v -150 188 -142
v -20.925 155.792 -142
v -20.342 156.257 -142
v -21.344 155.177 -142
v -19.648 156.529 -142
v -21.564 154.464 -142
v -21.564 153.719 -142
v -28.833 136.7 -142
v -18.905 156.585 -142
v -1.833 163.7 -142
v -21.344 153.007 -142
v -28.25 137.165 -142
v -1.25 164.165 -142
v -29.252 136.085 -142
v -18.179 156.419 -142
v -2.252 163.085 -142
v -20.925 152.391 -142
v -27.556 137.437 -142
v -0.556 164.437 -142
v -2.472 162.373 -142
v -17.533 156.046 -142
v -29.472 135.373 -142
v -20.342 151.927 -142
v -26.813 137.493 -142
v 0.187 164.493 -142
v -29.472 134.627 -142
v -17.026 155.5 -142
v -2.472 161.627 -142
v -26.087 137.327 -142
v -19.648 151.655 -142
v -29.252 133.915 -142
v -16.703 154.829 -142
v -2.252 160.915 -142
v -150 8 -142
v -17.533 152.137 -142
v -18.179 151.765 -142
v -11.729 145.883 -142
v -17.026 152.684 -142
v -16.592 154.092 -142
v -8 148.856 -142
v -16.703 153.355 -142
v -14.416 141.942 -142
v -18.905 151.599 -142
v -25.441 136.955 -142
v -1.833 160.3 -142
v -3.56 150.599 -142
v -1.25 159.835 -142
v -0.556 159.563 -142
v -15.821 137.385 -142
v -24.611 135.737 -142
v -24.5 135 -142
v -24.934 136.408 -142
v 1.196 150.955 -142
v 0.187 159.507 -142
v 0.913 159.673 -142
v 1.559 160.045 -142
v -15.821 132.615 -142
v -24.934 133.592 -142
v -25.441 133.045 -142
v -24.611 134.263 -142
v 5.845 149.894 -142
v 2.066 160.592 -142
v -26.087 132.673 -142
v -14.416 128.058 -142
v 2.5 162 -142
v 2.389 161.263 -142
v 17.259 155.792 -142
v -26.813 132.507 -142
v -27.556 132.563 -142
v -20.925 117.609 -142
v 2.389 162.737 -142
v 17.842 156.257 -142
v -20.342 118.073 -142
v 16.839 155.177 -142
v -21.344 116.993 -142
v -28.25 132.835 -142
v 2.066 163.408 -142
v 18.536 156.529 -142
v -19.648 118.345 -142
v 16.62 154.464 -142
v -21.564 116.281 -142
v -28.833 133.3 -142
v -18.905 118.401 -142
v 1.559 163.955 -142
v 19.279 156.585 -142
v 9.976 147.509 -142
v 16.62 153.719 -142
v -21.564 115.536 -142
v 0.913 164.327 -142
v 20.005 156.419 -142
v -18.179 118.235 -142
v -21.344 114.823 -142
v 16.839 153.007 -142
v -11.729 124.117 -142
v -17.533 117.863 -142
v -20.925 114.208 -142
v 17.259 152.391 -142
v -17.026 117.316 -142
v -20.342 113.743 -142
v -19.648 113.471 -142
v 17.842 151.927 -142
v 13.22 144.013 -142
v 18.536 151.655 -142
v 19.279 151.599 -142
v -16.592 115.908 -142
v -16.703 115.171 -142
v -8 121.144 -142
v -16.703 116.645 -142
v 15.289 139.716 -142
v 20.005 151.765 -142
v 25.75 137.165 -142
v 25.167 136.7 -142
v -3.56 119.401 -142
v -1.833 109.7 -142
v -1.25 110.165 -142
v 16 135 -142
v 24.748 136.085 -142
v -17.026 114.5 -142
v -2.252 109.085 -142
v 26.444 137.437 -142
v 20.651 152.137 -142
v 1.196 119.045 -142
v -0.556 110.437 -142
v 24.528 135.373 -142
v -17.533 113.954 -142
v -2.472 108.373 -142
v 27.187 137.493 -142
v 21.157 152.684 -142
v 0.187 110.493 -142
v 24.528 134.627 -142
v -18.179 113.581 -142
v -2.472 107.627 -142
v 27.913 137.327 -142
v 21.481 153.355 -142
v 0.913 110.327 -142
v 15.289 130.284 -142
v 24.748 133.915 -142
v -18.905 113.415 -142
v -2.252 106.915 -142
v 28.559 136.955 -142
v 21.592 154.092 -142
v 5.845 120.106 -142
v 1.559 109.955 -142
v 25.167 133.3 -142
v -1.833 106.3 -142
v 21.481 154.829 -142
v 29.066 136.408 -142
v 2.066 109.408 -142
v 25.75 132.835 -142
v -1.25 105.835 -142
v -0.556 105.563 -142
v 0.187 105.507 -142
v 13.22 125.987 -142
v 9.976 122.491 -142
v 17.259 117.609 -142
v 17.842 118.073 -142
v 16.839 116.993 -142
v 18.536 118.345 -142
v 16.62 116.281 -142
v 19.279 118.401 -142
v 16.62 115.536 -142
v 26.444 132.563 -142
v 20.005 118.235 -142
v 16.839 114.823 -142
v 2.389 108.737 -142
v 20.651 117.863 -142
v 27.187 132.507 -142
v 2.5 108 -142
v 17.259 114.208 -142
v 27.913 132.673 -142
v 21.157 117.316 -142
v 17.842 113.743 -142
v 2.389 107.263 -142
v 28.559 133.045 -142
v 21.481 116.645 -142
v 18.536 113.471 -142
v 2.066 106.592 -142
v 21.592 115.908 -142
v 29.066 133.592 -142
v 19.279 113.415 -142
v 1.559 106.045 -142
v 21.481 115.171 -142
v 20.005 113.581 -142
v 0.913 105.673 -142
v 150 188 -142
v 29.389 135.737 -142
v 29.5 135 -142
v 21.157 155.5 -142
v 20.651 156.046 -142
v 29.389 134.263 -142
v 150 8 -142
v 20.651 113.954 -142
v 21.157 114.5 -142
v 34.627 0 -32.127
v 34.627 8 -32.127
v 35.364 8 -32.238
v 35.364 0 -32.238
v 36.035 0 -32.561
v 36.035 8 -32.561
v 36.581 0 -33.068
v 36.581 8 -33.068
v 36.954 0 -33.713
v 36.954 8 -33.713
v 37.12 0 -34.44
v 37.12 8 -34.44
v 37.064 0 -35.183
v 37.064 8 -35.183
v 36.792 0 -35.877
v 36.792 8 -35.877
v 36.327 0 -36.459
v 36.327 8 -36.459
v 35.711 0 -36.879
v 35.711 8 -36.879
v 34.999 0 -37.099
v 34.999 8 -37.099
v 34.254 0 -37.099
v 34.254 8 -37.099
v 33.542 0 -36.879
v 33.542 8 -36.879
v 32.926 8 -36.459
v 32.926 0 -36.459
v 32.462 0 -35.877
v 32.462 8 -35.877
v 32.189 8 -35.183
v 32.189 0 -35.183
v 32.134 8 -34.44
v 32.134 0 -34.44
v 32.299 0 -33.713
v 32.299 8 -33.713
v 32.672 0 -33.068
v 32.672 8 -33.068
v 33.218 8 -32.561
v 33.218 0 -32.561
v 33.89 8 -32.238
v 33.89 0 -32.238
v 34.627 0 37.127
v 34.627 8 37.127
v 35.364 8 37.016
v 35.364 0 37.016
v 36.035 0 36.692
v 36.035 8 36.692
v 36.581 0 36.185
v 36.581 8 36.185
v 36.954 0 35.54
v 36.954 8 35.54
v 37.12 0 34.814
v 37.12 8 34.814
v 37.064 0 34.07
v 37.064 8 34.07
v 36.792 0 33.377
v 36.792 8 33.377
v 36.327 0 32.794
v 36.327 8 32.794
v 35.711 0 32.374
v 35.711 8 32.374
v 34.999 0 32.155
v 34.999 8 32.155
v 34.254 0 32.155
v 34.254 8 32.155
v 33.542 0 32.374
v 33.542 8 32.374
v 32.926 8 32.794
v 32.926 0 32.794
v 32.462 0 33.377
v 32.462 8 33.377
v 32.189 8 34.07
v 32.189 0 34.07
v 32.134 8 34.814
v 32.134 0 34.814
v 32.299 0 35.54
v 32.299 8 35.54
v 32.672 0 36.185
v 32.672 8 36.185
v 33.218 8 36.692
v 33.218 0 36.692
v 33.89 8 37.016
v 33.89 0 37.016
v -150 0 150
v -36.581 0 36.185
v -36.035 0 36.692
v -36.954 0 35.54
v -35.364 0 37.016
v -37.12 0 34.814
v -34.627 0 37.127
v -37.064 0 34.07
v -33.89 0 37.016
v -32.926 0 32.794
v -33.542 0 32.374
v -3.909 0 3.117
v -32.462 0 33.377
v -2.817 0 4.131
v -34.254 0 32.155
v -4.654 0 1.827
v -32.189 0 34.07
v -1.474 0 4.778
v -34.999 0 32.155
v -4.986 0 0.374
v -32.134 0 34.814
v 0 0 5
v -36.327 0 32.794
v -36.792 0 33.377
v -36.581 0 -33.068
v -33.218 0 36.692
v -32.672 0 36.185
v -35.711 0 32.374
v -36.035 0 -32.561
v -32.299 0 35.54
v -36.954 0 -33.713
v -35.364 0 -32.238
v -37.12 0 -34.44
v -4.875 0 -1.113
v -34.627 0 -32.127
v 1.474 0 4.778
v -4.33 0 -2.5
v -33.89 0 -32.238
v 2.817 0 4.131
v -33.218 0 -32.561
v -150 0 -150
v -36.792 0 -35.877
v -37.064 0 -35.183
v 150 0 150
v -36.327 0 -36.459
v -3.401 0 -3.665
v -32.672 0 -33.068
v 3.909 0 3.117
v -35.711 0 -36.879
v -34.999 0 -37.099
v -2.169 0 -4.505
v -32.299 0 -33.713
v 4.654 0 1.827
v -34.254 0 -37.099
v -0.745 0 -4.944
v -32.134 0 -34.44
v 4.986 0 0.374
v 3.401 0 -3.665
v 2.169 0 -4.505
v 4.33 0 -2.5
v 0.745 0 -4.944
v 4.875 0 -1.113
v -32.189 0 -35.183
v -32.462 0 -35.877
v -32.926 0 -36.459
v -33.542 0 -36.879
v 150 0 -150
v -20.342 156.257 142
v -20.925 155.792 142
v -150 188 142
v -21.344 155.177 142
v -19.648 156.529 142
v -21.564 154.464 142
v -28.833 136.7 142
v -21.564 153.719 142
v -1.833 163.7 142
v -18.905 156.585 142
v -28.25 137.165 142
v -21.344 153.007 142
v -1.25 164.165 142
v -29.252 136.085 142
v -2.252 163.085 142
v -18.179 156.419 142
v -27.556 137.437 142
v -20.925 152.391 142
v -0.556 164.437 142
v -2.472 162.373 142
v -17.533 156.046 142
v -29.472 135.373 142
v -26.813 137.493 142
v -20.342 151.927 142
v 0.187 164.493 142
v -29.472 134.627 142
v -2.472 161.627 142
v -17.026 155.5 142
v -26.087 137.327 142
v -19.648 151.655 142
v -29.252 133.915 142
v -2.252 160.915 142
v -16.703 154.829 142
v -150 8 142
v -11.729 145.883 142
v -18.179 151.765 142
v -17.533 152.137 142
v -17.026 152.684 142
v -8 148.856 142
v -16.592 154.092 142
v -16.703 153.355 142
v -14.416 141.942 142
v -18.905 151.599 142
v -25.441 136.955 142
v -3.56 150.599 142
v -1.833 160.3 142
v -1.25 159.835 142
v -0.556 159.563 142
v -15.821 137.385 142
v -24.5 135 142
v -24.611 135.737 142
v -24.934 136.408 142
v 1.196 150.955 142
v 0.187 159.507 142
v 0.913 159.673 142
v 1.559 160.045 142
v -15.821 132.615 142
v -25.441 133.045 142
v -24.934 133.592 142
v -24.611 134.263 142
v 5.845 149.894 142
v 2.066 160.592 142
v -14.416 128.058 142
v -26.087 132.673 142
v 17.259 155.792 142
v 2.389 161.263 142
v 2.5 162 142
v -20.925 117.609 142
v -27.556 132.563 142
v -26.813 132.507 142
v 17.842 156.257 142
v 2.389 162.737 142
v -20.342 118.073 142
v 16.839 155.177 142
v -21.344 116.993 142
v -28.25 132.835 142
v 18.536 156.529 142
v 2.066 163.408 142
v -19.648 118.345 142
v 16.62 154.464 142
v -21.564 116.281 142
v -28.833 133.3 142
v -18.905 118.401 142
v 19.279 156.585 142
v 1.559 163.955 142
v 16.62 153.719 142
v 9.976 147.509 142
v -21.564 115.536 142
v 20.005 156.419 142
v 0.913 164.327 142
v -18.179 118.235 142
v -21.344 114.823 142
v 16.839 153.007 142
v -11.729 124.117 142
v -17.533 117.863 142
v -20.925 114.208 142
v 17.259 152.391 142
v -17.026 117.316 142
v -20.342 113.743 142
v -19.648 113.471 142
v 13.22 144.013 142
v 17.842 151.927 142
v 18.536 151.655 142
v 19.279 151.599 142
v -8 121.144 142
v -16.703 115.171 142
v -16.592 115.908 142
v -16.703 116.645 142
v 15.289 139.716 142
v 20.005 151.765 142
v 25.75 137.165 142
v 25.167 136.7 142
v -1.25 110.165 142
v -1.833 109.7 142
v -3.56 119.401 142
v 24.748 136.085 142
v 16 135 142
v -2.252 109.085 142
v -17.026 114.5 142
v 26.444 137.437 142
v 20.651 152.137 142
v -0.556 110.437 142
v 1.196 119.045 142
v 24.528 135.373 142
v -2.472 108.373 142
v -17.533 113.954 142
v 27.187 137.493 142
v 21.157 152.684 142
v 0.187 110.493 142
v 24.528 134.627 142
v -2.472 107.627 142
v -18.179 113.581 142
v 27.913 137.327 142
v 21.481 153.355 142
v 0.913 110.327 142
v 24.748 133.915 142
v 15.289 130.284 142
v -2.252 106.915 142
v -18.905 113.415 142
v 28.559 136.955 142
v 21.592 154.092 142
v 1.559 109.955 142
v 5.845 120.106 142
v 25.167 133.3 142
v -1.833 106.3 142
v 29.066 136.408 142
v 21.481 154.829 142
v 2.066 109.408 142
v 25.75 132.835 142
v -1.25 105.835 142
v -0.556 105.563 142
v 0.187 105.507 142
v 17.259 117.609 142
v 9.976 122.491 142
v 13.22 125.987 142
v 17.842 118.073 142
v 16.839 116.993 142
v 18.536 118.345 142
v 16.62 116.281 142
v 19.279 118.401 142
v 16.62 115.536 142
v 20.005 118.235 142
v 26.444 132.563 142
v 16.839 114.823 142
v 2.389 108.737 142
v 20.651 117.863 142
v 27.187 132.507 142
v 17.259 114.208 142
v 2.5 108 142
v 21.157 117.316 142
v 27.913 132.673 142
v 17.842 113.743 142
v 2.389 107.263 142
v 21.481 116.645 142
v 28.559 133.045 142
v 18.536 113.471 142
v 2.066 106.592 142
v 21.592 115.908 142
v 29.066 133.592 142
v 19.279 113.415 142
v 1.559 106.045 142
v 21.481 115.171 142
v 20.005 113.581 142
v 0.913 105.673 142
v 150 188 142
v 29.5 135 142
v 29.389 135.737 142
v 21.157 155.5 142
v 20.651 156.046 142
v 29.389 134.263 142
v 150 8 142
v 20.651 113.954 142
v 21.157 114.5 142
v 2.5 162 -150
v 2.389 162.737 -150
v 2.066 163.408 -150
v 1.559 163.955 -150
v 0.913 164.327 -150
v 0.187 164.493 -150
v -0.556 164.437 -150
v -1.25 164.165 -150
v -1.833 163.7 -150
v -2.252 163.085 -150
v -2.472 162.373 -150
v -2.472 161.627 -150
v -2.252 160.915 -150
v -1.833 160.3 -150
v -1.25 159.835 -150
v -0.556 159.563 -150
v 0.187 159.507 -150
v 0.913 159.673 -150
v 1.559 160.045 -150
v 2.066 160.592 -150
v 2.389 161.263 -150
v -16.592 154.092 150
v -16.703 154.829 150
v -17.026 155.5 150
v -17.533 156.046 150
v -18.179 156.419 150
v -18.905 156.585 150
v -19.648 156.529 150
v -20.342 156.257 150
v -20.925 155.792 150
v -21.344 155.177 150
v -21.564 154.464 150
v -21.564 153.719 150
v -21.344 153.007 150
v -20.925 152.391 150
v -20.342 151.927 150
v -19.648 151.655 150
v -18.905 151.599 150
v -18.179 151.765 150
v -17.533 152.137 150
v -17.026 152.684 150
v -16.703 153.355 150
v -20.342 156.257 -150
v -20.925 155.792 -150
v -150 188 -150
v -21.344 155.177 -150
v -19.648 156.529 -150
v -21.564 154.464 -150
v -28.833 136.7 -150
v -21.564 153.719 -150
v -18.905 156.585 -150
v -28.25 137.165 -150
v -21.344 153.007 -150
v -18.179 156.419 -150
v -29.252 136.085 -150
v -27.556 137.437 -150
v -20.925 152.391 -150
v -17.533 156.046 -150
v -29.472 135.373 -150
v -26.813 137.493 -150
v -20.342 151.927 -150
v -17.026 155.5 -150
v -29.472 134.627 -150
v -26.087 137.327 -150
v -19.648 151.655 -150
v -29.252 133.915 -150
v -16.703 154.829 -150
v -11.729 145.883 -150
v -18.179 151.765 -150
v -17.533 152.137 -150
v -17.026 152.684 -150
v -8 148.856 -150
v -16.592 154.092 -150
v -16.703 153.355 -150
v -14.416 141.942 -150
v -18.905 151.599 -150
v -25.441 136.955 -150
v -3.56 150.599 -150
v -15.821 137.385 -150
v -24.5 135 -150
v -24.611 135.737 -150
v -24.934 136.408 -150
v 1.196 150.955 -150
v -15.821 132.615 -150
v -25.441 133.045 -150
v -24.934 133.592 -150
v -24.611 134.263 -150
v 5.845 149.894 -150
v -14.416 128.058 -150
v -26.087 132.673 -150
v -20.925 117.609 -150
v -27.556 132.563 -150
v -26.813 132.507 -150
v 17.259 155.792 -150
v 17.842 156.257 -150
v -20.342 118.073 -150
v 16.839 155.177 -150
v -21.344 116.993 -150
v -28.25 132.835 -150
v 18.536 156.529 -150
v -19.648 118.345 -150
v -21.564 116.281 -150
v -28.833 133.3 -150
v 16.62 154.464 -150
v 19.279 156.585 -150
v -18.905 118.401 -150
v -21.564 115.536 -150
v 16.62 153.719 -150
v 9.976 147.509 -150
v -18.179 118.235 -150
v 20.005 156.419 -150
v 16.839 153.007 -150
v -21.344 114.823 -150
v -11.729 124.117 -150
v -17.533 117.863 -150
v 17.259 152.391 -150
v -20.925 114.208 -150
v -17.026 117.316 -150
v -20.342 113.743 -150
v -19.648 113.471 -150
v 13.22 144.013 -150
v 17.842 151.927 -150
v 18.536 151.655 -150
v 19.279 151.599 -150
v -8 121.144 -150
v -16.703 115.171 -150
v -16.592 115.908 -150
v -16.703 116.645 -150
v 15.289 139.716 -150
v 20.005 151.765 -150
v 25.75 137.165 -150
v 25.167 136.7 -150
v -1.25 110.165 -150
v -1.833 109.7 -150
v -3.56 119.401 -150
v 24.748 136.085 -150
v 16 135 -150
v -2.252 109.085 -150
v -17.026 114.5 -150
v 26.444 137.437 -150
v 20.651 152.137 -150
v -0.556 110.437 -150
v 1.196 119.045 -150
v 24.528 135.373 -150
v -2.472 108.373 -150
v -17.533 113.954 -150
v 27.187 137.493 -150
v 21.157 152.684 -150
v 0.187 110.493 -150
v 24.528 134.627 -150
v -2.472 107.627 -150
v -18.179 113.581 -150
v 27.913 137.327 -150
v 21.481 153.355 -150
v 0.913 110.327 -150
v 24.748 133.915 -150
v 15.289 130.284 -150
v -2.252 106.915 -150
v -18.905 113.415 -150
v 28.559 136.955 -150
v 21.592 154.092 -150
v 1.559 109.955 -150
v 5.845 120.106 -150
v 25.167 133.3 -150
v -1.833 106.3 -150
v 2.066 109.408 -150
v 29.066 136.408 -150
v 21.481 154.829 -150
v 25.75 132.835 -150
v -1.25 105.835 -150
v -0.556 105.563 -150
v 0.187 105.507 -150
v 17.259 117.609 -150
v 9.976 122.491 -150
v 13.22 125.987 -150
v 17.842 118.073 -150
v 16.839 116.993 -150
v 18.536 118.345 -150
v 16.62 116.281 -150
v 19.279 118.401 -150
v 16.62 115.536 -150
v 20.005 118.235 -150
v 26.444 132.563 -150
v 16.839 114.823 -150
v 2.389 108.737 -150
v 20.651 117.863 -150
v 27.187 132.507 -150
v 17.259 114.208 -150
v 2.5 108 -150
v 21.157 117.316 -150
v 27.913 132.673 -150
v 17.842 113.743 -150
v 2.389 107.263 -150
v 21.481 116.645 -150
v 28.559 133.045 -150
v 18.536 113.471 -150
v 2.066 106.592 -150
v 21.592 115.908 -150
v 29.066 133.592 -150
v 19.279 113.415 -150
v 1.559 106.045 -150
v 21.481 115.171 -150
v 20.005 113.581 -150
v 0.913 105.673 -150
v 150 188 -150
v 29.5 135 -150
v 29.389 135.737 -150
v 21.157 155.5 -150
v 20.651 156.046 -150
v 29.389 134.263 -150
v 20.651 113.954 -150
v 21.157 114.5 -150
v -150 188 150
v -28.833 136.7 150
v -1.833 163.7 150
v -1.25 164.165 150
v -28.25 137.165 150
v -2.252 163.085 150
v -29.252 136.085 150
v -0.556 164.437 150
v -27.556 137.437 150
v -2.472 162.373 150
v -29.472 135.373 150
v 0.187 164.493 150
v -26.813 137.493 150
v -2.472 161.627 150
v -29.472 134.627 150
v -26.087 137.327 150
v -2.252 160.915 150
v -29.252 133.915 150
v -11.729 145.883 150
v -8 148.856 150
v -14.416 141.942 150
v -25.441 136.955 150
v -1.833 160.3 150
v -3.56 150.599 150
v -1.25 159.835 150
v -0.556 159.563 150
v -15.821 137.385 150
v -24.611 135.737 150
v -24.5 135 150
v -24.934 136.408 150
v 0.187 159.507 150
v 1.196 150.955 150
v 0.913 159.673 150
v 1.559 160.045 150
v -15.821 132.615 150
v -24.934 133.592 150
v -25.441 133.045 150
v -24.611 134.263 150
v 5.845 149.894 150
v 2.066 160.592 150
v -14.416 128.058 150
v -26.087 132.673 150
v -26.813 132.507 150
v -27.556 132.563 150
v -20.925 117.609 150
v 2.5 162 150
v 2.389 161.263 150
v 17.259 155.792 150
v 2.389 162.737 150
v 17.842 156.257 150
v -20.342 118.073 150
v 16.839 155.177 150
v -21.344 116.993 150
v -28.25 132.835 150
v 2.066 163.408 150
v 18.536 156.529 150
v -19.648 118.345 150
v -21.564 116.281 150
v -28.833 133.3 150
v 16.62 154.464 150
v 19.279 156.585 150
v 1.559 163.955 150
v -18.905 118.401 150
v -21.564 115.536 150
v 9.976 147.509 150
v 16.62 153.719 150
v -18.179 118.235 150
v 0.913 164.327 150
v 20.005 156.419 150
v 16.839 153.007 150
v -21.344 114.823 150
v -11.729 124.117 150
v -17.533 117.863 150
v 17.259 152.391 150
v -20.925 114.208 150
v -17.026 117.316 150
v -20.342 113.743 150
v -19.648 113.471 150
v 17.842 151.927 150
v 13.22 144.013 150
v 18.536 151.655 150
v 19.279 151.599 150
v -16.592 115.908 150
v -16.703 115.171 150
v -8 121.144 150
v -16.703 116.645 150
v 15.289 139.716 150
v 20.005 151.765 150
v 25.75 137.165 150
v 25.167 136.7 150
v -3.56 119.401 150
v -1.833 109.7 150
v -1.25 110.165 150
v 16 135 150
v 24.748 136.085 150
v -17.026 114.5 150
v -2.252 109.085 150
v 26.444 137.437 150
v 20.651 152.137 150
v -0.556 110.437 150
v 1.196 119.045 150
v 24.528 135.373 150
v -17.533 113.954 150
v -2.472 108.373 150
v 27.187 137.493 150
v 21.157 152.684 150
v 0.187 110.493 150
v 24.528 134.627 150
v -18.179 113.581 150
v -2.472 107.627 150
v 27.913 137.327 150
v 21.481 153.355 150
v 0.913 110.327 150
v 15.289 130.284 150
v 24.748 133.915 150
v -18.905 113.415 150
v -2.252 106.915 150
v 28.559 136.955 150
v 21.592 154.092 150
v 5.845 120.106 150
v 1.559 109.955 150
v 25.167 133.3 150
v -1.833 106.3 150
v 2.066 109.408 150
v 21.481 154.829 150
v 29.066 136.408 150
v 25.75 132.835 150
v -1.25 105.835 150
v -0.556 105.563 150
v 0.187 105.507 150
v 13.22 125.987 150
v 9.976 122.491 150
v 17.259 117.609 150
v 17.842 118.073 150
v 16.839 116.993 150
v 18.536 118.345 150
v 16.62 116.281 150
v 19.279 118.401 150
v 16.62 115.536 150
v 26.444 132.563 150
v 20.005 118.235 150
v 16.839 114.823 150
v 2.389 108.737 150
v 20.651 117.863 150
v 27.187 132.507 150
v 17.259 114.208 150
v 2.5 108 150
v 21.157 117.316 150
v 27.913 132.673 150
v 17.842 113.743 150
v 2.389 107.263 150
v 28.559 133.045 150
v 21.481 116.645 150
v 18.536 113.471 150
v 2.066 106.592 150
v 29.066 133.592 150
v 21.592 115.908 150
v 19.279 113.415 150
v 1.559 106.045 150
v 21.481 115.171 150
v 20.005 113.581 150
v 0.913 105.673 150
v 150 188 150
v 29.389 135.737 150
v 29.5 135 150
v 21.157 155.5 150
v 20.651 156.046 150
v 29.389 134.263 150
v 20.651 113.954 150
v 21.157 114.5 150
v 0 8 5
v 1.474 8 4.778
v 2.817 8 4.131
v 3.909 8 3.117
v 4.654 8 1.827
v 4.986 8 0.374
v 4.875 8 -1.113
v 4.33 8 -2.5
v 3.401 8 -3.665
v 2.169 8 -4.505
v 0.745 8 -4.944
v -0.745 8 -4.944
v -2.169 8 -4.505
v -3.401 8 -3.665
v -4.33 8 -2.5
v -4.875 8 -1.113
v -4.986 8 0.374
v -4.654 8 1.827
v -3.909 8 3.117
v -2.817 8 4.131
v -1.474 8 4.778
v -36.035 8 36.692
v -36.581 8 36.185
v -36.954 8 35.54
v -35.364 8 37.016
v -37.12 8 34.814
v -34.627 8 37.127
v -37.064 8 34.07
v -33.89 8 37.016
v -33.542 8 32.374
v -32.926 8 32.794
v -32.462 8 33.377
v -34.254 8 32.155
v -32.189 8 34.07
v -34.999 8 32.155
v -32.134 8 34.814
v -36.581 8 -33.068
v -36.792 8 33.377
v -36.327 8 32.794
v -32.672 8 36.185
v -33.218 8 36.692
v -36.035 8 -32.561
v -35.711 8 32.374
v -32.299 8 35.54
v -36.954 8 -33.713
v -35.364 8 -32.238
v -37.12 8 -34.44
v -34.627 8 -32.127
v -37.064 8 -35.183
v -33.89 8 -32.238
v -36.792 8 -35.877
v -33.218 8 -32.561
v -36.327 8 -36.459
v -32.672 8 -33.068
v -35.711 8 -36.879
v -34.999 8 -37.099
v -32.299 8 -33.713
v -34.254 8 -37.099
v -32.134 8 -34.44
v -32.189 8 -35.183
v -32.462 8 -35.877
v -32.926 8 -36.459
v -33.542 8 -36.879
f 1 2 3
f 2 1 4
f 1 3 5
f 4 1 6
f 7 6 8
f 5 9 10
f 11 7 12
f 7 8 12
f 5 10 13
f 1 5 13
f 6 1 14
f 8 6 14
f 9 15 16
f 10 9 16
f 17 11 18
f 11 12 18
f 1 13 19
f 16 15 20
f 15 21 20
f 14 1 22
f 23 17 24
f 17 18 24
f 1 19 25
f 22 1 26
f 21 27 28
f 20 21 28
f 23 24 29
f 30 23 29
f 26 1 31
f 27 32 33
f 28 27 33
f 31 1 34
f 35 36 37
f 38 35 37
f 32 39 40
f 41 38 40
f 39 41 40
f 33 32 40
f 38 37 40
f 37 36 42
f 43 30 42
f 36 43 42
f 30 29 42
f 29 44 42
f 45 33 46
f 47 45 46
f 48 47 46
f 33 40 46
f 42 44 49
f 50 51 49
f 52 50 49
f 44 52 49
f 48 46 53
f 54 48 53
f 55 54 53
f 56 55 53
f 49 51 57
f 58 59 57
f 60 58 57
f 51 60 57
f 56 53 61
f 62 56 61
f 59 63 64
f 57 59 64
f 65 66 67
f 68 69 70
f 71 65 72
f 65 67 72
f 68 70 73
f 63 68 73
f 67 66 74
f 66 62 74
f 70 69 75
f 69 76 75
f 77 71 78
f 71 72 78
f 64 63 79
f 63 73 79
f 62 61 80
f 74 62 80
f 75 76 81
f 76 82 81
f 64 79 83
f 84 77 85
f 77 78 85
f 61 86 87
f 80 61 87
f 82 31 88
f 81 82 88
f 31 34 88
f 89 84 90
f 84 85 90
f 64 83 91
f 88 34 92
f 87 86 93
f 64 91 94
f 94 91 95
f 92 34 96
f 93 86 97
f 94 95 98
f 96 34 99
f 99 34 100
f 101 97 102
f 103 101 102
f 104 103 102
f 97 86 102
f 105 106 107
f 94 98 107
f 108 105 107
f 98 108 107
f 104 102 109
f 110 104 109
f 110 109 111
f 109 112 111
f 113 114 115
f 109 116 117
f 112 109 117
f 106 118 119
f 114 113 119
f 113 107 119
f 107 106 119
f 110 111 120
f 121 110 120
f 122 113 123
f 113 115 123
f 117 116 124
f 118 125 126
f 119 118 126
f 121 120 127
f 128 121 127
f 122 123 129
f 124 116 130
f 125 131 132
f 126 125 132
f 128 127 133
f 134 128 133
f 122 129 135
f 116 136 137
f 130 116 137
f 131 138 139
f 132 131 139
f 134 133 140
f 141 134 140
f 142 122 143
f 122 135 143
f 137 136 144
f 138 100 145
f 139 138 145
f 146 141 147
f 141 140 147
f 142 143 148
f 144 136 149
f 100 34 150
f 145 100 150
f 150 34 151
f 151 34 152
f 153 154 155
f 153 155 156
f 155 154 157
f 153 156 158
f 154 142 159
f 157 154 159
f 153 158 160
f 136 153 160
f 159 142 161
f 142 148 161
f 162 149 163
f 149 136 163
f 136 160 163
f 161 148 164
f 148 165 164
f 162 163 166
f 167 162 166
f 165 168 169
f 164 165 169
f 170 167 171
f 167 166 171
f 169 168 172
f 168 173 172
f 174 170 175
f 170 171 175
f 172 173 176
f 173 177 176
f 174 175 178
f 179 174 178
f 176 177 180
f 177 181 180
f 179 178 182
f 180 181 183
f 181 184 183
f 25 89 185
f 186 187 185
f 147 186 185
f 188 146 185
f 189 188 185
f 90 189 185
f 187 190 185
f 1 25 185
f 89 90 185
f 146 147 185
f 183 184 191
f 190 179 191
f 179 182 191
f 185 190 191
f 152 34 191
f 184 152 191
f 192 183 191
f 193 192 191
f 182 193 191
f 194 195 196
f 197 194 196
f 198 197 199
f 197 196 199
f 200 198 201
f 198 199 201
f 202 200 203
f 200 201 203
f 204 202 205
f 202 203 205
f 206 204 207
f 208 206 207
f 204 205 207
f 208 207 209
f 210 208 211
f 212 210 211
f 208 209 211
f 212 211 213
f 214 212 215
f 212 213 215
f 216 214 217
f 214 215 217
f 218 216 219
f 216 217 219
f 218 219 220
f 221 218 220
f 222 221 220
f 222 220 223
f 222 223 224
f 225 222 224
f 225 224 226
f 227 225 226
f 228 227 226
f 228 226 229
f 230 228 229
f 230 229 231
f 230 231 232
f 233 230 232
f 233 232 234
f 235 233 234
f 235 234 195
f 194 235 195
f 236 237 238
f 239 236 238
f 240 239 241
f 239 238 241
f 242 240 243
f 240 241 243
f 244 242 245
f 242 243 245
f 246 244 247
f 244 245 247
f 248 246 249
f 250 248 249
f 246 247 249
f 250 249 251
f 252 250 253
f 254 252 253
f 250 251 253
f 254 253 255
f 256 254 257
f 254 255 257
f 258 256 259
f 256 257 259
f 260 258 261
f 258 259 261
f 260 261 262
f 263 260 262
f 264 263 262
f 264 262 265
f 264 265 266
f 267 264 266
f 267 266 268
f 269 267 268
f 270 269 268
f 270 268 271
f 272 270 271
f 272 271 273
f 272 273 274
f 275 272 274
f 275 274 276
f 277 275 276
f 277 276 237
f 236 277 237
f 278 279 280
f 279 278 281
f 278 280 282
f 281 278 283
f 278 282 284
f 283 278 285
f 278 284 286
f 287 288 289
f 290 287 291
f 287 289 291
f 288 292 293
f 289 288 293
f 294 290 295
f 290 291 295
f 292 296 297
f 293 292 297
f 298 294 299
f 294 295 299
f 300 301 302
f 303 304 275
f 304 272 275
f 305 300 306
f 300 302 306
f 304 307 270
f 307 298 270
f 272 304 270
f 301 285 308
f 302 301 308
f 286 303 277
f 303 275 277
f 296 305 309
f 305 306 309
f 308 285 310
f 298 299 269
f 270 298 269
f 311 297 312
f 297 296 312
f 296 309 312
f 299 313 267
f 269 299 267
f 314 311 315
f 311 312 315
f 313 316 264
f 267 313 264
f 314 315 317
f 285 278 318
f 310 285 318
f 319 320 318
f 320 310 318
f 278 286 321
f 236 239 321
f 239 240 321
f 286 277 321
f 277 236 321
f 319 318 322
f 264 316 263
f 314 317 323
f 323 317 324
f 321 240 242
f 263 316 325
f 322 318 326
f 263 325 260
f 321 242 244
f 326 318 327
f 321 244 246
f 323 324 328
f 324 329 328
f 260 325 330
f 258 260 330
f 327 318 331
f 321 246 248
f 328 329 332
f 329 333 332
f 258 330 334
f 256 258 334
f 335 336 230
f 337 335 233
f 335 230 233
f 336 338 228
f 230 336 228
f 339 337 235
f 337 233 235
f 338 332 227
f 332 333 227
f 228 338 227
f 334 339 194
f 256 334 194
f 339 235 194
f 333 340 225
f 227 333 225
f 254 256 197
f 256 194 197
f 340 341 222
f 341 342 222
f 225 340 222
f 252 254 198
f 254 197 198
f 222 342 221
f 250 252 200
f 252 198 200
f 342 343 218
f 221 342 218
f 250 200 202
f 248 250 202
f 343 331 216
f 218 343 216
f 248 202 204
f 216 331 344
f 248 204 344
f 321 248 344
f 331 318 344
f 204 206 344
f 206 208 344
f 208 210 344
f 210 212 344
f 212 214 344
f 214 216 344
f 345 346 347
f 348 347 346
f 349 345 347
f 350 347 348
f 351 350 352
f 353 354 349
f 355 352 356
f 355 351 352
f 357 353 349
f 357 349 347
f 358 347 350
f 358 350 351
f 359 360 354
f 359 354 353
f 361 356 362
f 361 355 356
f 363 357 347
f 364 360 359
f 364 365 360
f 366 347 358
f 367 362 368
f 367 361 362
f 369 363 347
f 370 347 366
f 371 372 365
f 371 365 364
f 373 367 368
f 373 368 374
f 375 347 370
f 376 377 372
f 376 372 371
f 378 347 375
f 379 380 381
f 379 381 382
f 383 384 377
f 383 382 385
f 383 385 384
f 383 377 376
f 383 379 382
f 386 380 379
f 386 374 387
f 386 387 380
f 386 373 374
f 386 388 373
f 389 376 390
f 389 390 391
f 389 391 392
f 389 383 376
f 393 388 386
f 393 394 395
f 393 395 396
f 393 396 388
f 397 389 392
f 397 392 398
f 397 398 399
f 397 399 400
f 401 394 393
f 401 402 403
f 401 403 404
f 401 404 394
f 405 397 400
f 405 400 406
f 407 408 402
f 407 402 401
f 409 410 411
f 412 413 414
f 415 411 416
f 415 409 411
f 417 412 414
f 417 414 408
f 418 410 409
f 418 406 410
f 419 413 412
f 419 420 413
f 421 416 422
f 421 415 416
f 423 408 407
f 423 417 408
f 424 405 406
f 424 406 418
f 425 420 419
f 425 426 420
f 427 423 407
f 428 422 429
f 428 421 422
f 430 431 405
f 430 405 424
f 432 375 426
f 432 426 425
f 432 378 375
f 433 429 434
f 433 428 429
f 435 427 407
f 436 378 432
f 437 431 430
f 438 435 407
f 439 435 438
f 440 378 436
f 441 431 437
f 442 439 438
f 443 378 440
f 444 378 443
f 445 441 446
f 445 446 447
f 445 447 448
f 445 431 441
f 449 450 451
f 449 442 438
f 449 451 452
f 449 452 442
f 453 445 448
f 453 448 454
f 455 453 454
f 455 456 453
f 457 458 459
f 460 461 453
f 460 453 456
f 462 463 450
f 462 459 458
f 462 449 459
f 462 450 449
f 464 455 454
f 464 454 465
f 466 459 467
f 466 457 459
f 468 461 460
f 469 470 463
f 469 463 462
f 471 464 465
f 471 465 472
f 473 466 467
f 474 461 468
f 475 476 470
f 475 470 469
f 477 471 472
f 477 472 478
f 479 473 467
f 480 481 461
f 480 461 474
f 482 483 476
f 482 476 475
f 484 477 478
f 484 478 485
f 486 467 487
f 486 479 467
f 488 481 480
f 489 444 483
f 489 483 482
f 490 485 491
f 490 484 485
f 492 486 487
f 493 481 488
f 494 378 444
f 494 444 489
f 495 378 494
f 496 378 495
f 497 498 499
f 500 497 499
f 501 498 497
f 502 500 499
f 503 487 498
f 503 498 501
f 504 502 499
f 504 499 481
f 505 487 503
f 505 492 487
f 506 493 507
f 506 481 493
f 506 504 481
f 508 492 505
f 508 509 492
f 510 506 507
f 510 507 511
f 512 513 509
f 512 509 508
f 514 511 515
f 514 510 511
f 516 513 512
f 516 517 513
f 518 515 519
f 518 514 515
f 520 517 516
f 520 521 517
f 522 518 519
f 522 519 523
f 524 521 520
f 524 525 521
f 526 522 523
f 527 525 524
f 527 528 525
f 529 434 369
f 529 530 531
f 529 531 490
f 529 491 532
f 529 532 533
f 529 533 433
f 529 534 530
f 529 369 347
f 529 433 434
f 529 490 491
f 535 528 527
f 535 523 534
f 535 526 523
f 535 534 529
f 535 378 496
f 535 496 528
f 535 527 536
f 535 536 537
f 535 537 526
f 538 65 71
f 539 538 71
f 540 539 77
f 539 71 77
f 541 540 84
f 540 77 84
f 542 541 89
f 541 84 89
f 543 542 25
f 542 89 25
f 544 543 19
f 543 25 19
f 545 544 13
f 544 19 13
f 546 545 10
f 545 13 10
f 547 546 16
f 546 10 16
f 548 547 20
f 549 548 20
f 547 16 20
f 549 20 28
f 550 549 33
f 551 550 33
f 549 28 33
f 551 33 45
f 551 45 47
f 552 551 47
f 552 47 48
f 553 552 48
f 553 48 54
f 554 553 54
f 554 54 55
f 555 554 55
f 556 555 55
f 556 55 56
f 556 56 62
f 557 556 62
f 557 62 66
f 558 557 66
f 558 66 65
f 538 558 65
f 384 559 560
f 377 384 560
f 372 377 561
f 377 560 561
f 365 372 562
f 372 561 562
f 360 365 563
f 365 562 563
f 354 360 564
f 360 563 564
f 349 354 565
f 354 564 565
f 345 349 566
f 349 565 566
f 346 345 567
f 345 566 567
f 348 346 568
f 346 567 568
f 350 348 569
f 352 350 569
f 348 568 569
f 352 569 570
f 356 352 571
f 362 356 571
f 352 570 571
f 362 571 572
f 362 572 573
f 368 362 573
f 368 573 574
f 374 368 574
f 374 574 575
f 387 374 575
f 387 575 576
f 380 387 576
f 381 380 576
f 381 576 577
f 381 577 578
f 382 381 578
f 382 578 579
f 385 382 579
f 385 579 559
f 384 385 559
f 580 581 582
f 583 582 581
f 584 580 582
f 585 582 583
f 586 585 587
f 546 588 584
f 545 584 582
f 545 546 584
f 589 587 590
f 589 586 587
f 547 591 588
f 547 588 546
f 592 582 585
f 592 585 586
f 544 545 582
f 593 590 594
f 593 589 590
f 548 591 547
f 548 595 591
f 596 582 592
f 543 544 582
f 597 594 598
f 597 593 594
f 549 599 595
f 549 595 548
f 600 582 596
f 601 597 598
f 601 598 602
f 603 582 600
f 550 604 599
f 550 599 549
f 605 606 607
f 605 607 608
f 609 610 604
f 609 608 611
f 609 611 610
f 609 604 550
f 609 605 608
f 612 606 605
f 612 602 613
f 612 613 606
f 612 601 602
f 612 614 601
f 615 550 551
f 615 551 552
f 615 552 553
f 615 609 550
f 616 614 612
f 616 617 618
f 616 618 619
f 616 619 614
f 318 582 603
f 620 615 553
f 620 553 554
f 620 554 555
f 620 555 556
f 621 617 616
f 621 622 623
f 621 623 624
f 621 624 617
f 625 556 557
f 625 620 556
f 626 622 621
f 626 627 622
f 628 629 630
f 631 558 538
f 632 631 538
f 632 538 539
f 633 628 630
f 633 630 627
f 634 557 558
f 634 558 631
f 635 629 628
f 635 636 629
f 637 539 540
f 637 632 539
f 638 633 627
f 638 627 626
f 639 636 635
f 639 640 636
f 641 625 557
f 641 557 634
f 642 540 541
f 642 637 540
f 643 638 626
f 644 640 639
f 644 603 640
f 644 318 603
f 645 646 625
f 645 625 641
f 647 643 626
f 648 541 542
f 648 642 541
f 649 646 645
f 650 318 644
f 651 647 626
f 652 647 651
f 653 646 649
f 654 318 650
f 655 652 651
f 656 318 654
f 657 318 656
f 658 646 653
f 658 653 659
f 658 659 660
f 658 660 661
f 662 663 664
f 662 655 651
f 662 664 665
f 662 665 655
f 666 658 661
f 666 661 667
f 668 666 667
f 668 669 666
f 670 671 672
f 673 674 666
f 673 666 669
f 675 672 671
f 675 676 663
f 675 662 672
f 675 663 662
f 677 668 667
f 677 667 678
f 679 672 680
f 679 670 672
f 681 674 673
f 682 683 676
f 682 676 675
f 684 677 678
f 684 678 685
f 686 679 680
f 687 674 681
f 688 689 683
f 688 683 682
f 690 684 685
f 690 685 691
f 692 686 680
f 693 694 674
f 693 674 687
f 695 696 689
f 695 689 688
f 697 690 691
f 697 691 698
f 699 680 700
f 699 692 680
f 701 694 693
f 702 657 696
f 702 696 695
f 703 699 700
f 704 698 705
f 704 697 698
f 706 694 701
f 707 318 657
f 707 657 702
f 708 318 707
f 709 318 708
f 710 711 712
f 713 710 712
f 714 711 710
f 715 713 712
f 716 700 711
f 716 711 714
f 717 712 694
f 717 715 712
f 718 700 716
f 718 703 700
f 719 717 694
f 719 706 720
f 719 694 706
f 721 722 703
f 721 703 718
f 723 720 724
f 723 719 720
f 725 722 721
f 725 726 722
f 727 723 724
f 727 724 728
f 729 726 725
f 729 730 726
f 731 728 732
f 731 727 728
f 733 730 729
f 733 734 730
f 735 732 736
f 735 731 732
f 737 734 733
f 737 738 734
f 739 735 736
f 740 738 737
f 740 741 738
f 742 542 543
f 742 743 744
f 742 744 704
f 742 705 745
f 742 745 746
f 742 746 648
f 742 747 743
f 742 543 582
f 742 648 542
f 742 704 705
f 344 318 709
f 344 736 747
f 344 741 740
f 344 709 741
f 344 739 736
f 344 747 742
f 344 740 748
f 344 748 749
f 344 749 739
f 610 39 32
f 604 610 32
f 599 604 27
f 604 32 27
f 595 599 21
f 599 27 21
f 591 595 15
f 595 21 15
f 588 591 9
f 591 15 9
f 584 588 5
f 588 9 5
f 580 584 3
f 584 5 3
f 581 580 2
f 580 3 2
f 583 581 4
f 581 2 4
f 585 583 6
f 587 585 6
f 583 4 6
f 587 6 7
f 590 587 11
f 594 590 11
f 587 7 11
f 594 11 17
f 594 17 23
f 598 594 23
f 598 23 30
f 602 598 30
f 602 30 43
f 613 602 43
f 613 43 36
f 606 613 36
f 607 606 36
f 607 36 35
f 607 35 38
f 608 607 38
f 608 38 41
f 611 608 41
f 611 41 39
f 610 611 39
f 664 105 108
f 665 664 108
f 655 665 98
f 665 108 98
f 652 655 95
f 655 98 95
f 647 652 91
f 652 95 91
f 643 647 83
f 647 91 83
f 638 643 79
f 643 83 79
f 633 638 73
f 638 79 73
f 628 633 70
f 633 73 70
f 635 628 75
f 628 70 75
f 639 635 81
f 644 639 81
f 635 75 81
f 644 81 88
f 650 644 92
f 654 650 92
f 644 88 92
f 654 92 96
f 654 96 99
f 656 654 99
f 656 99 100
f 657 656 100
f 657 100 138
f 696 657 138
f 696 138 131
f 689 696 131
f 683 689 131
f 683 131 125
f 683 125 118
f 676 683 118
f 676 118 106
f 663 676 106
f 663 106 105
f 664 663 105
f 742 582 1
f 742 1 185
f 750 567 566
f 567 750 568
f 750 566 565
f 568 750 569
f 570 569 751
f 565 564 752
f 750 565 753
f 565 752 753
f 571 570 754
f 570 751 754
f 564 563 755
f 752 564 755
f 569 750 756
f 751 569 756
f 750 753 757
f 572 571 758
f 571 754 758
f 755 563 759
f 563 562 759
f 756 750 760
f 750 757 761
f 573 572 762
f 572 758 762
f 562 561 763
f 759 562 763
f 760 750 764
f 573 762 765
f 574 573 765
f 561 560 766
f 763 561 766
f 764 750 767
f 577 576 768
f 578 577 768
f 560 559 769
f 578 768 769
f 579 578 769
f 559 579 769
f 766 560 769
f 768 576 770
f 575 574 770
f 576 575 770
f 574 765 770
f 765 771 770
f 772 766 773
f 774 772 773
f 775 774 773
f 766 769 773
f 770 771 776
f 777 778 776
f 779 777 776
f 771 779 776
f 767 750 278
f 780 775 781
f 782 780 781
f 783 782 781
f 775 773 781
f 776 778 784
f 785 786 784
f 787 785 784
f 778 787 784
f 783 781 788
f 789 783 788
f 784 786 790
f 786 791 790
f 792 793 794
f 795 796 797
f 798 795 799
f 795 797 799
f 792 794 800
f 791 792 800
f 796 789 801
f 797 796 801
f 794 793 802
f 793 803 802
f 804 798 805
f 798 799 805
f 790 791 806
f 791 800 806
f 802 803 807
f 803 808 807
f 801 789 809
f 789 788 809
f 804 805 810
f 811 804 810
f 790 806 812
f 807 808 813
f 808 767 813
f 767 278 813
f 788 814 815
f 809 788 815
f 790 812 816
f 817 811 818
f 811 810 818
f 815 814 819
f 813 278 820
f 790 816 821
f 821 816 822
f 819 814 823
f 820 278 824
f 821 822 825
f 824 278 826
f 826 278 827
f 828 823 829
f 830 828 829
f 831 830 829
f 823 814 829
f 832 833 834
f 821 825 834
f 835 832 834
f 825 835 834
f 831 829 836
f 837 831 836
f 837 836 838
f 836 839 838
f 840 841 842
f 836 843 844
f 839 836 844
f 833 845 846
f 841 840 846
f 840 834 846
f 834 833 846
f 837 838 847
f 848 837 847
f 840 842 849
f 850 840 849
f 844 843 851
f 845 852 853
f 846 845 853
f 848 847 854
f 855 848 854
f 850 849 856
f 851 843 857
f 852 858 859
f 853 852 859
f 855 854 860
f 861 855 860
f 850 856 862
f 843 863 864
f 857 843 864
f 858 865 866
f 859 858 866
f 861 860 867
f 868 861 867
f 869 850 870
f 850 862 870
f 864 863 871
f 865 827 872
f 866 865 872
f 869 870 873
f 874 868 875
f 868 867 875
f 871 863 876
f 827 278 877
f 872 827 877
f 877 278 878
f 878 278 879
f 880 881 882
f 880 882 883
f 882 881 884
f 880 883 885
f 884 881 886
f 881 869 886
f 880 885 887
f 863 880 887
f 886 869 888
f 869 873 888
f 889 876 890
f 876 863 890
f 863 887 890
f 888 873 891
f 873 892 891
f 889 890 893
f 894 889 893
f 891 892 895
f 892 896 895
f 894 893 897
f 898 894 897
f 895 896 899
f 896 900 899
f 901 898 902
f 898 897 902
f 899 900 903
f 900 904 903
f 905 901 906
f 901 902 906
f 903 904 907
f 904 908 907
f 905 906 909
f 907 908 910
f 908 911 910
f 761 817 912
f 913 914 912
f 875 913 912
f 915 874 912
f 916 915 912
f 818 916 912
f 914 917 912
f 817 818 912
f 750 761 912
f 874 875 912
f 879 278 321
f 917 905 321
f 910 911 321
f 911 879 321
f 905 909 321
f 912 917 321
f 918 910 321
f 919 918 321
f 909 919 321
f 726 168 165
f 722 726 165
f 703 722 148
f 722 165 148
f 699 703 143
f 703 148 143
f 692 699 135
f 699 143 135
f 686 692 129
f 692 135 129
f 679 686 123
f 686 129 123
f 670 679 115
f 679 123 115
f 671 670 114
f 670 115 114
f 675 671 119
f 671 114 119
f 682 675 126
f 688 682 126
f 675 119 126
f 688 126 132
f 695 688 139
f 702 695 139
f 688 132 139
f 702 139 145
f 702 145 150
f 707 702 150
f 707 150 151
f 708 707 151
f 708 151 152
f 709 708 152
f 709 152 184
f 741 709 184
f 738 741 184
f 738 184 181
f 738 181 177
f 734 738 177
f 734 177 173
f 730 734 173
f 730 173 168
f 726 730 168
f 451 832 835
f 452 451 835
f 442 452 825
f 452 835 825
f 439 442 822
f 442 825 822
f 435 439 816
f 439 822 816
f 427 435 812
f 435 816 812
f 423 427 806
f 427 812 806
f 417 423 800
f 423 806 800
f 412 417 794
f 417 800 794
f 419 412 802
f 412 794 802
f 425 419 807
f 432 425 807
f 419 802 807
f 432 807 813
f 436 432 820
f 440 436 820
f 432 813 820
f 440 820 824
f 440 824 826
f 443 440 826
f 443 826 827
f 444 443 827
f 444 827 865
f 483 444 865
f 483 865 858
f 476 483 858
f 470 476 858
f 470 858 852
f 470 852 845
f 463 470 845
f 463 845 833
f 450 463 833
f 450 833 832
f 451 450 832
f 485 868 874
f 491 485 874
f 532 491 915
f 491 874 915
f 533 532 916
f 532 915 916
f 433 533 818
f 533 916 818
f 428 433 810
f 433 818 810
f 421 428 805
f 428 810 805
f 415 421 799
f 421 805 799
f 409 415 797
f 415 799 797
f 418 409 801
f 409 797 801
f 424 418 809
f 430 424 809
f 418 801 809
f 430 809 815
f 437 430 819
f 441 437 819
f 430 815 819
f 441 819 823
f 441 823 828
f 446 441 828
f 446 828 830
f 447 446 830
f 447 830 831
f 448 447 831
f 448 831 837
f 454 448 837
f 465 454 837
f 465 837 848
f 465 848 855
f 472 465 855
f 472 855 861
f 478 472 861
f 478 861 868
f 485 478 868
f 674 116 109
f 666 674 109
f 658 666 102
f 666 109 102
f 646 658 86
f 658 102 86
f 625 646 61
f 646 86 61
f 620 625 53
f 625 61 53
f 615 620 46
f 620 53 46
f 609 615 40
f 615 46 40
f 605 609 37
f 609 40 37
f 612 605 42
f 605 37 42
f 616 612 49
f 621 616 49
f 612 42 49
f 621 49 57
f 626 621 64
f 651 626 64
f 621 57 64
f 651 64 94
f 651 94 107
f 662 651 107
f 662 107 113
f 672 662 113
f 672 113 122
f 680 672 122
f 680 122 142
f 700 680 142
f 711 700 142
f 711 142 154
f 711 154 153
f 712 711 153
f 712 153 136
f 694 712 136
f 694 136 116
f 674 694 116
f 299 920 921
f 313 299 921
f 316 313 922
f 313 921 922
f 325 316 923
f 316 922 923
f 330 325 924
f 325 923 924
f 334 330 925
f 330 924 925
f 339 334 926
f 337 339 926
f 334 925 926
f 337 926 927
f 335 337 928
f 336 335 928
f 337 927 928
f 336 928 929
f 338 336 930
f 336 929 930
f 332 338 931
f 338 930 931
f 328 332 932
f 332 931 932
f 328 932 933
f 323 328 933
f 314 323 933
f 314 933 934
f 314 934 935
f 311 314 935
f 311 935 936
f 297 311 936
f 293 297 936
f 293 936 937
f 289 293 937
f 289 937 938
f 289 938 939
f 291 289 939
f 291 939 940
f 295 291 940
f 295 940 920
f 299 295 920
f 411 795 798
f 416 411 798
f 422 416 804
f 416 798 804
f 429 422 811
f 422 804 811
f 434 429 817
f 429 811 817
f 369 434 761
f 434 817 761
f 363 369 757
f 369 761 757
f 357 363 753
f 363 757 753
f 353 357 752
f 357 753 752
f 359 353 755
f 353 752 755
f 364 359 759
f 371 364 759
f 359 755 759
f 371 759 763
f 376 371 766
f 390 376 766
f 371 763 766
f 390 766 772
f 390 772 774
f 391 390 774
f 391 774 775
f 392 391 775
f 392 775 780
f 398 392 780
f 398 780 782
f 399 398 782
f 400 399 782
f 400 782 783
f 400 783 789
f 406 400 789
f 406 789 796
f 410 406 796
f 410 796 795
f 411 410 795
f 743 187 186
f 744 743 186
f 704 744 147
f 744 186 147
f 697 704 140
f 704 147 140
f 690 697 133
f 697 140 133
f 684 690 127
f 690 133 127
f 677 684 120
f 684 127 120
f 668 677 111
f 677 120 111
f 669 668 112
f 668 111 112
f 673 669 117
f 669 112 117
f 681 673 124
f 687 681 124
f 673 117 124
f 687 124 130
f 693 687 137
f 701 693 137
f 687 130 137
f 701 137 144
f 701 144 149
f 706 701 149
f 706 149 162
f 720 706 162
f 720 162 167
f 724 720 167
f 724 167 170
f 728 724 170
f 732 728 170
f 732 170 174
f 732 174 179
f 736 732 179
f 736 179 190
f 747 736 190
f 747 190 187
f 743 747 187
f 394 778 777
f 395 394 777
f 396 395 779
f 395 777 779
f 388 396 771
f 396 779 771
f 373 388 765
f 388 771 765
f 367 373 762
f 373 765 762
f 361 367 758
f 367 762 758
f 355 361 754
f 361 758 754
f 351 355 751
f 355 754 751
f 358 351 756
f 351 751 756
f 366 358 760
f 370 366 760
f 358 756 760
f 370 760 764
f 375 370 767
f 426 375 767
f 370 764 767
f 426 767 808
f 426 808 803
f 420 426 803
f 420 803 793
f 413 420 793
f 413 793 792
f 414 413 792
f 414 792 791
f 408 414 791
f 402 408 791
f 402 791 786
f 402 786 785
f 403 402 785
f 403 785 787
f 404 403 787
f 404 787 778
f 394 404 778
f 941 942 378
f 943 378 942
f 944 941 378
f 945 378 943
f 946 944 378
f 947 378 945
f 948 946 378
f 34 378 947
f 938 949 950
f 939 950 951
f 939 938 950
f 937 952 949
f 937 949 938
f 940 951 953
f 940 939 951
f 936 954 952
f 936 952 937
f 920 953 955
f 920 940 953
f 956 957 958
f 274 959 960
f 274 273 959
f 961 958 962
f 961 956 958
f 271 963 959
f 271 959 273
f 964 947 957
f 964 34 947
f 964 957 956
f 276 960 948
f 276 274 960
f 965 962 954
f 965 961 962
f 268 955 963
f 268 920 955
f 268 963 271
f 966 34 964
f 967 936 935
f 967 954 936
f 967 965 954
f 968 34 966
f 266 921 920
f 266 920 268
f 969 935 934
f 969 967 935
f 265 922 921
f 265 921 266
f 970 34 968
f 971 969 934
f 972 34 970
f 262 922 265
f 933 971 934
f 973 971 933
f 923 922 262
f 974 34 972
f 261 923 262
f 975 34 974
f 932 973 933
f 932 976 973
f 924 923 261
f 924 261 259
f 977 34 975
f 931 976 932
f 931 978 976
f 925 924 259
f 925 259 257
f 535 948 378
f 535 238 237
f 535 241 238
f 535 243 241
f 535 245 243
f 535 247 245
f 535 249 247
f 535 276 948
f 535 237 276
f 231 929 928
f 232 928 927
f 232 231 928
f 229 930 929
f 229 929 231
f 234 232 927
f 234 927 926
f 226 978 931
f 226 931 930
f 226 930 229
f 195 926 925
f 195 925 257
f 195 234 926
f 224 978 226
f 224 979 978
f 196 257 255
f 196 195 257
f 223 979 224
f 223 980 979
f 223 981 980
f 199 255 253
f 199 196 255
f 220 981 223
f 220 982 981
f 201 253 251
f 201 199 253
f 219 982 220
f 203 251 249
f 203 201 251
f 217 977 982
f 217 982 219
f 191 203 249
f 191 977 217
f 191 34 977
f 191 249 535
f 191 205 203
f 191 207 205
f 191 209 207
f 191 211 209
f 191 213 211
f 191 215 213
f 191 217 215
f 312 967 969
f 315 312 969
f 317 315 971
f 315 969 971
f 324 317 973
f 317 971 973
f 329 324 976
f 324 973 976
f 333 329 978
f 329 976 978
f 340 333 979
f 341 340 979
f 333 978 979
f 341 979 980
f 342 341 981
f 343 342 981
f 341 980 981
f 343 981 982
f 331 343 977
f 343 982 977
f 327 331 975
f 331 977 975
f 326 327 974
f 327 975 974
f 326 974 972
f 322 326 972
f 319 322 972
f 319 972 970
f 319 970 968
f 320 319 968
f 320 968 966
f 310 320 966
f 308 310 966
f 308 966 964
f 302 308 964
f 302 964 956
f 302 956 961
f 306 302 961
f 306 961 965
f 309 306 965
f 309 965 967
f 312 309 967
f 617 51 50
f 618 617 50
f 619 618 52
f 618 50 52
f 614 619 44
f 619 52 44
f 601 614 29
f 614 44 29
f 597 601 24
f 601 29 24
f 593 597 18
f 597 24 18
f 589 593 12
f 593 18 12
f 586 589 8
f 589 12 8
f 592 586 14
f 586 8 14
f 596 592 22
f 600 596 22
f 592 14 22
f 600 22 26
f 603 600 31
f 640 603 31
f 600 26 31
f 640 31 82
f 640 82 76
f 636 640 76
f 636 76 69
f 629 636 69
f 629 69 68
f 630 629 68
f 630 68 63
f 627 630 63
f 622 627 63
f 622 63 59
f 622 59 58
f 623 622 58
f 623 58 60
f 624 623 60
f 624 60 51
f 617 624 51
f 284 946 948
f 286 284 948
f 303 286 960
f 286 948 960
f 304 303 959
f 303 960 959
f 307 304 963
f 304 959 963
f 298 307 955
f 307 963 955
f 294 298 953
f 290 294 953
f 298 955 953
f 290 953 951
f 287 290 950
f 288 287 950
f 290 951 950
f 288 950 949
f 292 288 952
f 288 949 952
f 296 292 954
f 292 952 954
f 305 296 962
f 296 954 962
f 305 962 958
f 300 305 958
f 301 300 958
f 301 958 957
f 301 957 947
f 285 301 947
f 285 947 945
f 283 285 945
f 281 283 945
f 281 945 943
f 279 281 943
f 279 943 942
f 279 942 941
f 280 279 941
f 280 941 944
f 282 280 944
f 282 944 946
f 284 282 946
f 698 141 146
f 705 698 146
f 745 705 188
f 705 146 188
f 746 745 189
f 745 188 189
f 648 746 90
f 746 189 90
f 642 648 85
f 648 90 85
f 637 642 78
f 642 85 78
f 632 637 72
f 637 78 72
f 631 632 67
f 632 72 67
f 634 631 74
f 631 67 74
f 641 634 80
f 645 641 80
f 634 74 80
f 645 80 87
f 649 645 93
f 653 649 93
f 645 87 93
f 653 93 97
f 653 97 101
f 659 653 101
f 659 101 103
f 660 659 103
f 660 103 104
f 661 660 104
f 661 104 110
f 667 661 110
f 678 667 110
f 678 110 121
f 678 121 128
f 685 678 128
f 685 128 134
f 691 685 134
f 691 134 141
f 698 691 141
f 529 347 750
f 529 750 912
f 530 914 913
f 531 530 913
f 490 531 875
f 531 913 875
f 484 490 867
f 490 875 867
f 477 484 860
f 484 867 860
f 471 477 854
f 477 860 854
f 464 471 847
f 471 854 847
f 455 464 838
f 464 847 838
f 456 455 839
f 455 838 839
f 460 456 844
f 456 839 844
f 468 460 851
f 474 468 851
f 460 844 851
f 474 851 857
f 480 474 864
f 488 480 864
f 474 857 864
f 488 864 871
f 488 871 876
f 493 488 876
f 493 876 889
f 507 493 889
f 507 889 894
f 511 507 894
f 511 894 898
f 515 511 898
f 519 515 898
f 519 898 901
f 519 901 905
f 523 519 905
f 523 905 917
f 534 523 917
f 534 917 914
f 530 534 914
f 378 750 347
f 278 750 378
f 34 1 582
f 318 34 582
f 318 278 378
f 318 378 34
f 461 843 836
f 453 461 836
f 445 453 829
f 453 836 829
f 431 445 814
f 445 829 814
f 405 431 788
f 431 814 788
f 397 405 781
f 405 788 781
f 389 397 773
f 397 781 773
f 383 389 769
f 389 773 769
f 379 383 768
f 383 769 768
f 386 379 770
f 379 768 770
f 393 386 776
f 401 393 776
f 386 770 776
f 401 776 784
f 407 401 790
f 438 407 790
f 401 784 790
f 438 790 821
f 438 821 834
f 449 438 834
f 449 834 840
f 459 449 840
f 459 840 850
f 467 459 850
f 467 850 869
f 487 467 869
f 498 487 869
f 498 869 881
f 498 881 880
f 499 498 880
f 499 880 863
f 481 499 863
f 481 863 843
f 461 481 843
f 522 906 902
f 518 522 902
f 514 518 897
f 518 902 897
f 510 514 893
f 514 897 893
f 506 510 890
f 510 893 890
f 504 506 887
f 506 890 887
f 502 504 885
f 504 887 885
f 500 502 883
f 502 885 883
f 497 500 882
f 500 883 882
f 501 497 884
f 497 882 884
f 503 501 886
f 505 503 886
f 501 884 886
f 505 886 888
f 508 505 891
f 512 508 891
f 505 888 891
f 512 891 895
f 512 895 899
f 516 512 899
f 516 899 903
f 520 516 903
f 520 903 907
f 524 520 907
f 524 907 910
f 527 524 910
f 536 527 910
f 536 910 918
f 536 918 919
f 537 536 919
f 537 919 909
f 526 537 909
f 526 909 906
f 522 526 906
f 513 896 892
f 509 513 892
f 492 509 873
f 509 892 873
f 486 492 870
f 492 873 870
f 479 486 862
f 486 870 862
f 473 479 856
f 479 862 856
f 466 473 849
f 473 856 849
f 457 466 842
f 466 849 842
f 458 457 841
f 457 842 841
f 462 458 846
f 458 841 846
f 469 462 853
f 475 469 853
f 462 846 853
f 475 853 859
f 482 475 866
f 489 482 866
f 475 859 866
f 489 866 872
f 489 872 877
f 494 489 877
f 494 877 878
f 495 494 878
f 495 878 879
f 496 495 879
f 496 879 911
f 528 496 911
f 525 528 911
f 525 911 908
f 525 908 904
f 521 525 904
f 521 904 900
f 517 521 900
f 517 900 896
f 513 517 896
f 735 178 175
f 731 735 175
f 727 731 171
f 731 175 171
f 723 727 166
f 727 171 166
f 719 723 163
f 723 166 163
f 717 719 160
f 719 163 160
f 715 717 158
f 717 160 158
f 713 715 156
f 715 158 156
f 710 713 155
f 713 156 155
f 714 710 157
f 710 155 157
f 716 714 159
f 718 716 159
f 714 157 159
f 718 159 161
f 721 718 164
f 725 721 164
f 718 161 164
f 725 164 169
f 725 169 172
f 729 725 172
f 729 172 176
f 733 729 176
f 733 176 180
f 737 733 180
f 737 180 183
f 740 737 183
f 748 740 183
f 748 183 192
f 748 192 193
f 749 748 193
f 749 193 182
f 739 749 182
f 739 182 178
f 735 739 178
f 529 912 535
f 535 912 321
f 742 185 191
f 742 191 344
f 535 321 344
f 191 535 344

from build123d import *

# Parameters (mm, degrees)
SKETCH5_W           = 300
SKETCH5_H           = 300
BOSS_EXTRUDE4_DEPTH = 8
SKETCH6_R           = 5
SKETCH6_R_2         = 2.5
CUT_EXTRUDE2_DEPTH  = 16
SKETCH7_W           = 300
SKETCH7_H           = 8
BOSS_EXTRUDE5_DEPTH = 180
SKETCH9_R           = 16
CUT_EXTRUDE3_DEPTH  = 350
SKETCH11_R          = 2.5
CUT_EXTRUDE4_DEPTH  = 310


with BuildPart() as part:
    # Sketch5 → Boss-Extrude4 (new body)
    with BuildSketch(Plane(origin=(0, 0, 0), x_dir=(1, 0, 0), z_dir=(0, 1, 0))):
        Rectangle(SKETCH5_W, SKETCH5_H)
    extrude(amount=BOSS_EXTRUDE4_DEPTH)

    # Sketch6 → Cut-Extrude2 (cut)
    with BuildSketch(Plane(origin=(0, 8, 0), x_dir=(1, 0, 0), z_dir=(0, 1, 0))):
        with Locations(Location((0, 0, 0), (0, 0, 270))):
            Circle(SKETCH6_R)
        with Locations(Location((-34.62667873, 34.62667873, 0), (0, 0, 270))):
            Circle(SKETCH6_R_2)
        with Locations(Location((34.62667873, 34.62667873, 0), (0, 0, 270))):
            Circle(SKETCH6_R_2)
        with Locations(Location((34.62667873, -34.62667873, 0), (0, 0, 270))):
            Circle(SKETCH6_R_2)
        with Locations(Location((-34.62667873, -34.62667873, 0), (0, 0, 270))):
            Circle(SKETCH6_R_2)
    extrude(amount=-CUT_EXTRUDE2_DEPTH, mode=Mode.SUBTRACT)

    # Sketch7 → Boss-Extrude5 (add)
    with BuildSketch(Plane(origin=(0, 8, 0), x_dir=(1, 0, 0), z_dir=(0, 1, 0))):
        with Locations((0, 146)):
            Rectangle(SKETCH7_W, SKETCH7_H)
        with Locations((0, -146)):
            Rectangle(SKETCH7_W, SKETCH7_H)
    extrude(amount=BOSS_EXTRUDE5_DEPTH)

    # Sketch9 → Cut-Extrude3 (cut)
    with BuildSketch(Plane.XY.offset(150)):
        with Locations((0, 135)):
            Circle(SKETCH9_R)
    extrude(amount=-CUT_EXTRUDE3_DEPTH, mode=Mode.SUBTRACT)

    # Sketch11 → Cut-Extrude4 (cut)
    with BuildSketch(Plane.XY.offset(150)):
        with Locations((0, 162)):
            Circle(SKETCH11_R)
        with Locations((19.091883092, 154.091883092)):
            Circle(SKETCH11_R)
        with Locations((27, 135)):
            Circle(SKETCH11_R)
        with Locations((19.091883092, 115.908116908)):
            Circle(SKETCH11_R)
        with Locations((0, 108)):
            Circle(SKETCH11_R)
        with Locations((-19.091883092, 115.908116908)):
            Circle(SKETCH11_R)
        with Locations((-27, 135)):
            Circle(SKETCH11_R)
        with Locations((-19.091883092, 154.091883092)):
            Circle(SKETCH11_R)
    extrude(amount=-CUT_EXTRUDE4_DEPTH, mode=Mode.SUBTRACT)


solid = part.part
